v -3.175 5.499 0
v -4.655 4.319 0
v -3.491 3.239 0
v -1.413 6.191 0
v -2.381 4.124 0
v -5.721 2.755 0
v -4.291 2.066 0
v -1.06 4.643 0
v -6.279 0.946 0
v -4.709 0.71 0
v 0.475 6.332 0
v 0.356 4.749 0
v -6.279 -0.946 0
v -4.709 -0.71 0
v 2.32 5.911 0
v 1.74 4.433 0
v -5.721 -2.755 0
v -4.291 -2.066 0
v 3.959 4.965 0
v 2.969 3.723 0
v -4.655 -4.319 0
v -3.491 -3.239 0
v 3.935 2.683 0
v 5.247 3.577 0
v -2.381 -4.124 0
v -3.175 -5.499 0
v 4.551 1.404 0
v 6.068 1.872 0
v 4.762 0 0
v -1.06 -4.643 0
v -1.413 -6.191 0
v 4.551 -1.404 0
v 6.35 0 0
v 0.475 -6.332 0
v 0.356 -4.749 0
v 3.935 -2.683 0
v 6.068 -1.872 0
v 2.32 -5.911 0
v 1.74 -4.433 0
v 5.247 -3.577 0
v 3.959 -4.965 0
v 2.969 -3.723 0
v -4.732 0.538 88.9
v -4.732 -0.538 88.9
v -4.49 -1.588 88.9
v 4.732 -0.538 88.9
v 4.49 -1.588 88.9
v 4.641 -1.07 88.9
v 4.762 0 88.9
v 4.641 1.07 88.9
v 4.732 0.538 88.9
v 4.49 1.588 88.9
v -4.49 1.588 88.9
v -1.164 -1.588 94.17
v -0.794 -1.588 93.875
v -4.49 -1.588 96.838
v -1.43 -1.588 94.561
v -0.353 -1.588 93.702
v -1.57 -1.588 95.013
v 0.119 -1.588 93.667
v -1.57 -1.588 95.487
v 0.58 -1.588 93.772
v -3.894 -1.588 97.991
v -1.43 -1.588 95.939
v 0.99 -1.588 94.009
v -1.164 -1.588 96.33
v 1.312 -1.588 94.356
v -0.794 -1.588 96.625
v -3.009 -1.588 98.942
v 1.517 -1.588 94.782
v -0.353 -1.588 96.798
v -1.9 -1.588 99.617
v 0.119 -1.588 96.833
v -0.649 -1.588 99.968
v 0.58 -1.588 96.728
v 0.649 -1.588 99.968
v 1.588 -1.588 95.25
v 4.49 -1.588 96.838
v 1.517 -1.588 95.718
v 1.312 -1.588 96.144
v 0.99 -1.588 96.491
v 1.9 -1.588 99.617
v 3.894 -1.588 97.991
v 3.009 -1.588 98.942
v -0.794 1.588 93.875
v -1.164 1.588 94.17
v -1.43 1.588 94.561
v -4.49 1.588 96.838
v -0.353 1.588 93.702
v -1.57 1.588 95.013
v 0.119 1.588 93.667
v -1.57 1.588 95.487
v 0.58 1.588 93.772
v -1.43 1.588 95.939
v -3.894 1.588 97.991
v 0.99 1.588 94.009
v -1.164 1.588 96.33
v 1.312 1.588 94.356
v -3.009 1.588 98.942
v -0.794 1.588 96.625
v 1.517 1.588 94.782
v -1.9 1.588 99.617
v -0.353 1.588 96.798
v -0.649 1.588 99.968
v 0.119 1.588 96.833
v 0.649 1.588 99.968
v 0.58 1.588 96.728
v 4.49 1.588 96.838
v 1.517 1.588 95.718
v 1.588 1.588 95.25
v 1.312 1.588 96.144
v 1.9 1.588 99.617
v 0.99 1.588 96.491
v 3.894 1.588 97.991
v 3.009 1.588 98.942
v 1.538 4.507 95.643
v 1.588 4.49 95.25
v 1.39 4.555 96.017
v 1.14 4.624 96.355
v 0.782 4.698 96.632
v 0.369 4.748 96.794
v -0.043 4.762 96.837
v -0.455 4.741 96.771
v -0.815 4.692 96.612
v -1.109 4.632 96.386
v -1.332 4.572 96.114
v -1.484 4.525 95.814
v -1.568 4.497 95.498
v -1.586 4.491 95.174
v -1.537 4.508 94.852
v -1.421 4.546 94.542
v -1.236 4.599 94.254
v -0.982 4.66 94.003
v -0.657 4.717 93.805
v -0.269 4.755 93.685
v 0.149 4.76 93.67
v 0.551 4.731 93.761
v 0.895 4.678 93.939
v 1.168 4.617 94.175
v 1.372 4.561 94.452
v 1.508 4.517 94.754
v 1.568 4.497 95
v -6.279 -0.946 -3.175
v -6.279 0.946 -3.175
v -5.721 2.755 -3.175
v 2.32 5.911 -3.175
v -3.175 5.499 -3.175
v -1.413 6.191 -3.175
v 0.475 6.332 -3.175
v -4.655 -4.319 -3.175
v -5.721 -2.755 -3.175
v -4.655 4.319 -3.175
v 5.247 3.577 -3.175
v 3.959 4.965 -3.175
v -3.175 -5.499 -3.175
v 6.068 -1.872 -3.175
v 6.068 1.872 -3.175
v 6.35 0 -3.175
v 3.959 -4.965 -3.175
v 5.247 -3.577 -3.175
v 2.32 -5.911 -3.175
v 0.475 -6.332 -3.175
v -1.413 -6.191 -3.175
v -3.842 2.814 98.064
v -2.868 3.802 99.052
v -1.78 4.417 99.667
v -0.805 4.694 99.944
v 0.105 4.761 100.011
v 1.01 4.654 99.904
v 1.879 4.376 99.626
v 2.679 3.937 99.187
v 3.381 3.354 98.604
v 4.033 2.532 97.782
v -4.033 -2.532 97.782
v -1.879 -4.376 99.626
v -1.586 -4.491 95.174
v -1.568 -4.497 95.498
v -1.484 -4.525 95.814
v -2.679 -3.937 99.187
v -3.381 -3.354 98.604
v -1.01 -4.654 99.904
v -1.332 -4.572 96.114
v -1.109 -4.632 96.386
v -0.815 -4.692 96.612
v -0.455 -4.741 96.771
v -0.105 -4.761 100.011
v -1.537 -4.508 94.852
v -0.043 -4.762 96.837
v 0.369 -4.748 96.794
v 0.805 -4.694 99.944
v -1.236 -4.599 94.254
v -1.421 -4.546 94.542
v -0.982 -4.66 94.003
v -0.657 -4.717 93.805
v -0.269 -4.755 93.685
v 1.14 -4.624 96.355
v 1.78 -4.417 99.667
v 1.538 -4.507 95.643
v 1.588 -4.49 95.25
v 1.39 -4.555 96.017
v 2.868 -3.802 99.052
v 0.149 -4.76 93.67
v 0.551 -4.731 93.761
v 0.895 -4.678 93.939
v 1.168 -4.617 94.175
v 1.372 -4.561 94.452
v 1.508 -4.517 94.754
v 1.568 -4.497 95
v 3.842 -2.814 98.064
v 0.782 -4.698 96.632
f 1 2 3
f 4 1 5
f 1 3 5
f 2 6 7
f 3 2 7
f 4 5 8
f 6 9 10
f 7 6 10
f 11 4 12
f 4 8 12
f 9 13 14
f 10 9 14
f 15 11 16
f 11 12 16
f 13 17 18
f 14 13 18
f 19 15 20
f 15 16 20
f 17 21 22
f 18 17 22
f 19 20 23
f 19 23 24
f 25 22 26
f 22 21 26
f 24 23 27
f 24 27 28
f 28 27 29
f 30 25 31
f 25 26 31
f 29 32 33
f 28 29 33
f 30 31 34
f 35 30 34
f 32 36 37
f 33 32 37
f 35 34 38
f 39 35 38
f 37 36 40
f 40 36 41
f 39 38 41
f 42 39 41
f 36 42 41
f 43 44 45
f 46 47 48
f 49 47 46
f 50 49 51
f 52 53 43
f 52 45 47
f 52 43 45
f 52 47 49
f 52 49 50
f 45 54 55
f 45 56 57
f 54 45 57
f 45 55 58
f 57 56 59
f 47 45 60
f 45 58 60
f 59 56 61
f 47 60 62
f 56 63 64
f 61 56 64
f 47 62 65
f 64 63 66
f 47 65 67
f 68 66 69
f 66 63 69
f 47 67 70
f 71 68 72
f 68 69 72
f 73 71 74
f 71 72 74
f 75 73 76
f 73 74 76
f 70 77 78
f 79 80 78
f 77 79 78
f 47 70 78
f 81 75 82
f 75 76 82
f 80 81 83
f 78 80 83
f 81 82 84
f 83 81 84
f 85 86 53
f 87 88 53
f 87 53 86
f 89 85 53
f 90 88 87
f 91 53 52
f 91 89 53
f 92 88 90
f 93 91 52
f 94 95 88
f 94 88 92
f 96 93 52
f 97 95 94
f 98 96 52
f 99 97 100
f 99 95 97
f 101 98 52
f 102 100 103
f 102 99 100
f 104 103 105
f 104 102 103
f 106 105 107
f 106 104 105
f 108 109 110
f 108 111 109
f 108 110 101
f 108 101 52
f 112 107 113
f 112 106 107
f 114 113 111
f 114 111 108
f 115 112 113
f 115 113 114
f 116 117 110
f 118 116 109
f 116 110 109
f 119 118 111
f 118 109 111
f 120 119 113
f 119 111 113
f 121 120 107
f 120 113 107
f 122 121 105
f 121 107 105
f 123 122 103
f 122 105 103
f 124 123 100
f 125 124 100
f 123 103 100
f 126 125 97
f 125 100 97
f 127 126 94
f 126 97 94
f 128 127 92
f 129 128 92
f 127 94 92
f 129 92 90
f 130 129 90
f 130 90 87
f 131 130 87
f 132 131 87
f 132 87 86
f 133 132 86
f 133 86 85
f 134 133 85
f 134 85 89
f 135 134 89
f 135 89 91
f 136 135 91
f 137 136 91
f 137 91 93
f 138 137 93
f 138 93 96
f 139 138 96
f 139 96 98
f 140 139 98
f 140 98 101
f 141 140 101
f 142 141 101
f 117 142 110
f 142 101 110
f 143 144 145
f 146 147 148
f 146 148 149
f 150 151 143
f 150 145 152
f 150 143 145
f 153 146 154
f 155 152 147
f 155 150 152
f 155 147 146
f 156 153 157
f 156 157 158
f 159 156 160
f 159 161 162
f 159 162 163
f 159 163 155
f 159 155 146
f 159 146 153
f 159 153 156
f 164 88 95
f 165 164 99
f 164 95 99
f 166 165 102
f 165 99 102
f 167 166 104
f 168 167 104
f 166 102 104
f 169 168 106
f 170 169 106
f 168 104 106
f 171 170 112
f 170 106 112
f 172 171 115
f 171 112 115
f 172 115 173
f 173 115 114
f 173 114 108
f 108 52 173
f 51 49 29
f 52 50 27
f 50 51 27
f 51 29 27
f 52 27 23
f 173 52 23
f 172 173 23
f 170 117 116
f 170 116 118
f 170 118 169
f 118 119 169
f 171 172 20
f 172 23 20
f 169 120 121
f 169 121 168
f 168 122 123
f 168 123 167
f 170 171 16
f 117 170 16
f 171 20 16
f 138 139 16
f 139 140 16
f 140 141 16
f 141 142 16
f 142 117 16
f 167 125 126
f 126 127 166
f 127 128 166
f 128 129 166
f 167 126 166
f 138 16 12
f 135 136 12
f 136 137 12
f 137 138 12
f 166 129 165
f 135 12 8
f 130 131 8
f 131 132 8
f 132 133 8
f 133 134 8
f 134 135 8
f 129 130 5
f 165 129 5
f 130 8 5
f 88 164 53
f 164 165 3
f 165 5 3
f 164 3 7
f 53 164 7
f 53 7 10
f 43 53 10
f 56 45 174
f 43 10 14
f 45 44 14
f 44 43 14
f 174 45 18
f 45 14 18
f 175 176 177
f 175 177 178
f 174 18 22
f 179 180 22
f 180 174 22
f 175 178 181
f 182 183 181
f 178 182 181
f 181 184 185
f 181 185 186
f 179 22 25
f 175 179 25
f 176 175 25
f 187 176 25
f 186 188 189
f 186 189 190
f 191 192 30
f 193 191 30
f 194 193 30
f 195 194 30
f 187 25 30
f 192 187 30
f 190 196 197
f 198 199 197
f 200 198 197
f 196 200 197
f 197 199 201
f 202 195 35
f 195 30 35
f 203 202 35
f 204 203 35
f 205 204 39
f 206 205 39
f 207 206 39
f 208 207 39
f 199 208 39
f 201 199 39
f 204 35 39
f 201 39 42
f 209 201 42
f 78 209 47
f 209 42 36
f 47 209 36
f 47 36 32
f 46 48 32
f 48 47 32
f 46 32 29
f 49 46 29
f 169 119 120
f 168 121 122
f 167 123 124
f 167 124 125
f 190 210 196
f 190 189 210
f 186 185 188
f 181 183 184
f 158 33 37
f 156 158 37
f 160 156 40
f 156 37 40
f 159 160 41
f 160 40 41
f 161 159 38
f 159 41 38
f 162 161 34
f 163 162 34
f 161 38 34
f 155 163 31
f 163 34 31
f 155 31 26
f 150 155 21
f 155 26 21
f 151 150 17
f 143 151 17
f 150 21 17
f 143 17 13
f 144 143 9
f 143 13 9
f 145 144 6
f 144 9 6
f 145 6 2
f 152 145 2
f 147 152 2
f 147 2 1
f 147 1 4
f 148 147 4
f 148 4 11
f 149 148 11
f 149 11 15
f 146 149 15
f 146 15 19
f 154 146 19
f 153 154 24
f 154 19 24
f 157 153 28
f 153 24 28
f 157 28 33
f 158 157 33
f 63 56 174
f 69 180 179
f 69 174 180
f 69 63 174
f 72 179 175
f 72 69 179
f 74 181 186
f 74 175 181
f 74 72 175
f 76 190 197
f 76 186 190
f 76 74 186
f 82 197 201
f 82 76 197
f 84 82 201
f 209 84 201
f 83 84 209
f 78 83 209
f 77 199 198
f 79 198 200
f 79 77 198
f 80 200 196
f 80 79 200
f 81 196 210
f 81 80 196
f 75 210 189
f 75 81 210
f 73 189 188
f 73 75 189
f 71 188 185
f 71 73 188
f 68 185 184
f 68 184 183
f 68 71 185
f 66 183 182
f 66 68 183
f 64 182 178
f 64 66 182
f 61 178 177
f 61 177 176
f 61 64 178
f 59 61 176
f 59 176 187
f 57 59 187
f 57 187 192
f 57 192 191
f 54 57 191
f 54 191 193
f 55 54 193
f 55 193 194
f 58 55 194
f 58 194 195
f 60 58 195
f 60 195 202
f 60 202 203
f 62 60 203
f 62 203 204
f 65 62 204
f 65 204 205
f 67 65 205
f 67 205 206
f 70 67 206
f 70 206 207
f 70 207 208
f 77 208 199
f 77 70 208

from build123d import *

# Parameters (mm, degrees)
F0_R          = 4.7625
F1_DEPTH      = 101.6
F2_W          = 9.525
F2_H          = 3.175
F3_DEPTH      = 12.7
F4_R          = 1.5875
F5_DEPTH      = 151
F5_DEPTH_BACK = 151
F6_R          = 6.35
F7_DEPTH      = 3.175


# Not quite as in the source:
# - an extrude ends at something that could not be found from the text; its depth is read off the source's solid


with BuildPart() as f1:
    # F0 (on Top) → F1 (new body)
    with BuildSketch(Plane.XY):
        Circle(F0_R)
    extrude(amount=F1_DEPTH)

    # F2 (on face) → F3 (cut)
    with BuildSketch(Plane.XY.offset(101.6)):
        Rectangle(F2_W, F2_H)
    extrude(amount=-F3_DEPTH, mode=Mode.SUBTRACT)

    # F4 (on Front) → F5 (cut, two sides)
    with BuildSketch(Plane.XZ) as f5_sk:
        with BuildLine():
            Line((4.7625, 101.6), (-4.7625, 101.6))
            Line((-4.7625, 101.6), (-4.7625, 95.25))
            ThreePointArc((-4.7625, 95.25), (0, 100.0125), (4.7625, 95.25))
            Line((4.7625, 95.25), (4.7625, 101.6))
        make_face()
        with Locations((0, 95.25)):
            Circle(F4_R)
    extrude(amount=-F5_DEPTH, mode=Mode.SUBTRACT)
    extrude(f5_sk.sketch, amount=F5_DEPTH_BACK, mode=Mode.SUBTRACT)

    # F6 (on face) → F7 (join)
    with BuildSketch(Plane(origin=(0, 0, 0), x_dir=(1, 0, 0), z_dir=(0, 0, -1))):
        Circle(F6_R)
    extrude(amount=F7_DEPTH)


solid = f1.part
